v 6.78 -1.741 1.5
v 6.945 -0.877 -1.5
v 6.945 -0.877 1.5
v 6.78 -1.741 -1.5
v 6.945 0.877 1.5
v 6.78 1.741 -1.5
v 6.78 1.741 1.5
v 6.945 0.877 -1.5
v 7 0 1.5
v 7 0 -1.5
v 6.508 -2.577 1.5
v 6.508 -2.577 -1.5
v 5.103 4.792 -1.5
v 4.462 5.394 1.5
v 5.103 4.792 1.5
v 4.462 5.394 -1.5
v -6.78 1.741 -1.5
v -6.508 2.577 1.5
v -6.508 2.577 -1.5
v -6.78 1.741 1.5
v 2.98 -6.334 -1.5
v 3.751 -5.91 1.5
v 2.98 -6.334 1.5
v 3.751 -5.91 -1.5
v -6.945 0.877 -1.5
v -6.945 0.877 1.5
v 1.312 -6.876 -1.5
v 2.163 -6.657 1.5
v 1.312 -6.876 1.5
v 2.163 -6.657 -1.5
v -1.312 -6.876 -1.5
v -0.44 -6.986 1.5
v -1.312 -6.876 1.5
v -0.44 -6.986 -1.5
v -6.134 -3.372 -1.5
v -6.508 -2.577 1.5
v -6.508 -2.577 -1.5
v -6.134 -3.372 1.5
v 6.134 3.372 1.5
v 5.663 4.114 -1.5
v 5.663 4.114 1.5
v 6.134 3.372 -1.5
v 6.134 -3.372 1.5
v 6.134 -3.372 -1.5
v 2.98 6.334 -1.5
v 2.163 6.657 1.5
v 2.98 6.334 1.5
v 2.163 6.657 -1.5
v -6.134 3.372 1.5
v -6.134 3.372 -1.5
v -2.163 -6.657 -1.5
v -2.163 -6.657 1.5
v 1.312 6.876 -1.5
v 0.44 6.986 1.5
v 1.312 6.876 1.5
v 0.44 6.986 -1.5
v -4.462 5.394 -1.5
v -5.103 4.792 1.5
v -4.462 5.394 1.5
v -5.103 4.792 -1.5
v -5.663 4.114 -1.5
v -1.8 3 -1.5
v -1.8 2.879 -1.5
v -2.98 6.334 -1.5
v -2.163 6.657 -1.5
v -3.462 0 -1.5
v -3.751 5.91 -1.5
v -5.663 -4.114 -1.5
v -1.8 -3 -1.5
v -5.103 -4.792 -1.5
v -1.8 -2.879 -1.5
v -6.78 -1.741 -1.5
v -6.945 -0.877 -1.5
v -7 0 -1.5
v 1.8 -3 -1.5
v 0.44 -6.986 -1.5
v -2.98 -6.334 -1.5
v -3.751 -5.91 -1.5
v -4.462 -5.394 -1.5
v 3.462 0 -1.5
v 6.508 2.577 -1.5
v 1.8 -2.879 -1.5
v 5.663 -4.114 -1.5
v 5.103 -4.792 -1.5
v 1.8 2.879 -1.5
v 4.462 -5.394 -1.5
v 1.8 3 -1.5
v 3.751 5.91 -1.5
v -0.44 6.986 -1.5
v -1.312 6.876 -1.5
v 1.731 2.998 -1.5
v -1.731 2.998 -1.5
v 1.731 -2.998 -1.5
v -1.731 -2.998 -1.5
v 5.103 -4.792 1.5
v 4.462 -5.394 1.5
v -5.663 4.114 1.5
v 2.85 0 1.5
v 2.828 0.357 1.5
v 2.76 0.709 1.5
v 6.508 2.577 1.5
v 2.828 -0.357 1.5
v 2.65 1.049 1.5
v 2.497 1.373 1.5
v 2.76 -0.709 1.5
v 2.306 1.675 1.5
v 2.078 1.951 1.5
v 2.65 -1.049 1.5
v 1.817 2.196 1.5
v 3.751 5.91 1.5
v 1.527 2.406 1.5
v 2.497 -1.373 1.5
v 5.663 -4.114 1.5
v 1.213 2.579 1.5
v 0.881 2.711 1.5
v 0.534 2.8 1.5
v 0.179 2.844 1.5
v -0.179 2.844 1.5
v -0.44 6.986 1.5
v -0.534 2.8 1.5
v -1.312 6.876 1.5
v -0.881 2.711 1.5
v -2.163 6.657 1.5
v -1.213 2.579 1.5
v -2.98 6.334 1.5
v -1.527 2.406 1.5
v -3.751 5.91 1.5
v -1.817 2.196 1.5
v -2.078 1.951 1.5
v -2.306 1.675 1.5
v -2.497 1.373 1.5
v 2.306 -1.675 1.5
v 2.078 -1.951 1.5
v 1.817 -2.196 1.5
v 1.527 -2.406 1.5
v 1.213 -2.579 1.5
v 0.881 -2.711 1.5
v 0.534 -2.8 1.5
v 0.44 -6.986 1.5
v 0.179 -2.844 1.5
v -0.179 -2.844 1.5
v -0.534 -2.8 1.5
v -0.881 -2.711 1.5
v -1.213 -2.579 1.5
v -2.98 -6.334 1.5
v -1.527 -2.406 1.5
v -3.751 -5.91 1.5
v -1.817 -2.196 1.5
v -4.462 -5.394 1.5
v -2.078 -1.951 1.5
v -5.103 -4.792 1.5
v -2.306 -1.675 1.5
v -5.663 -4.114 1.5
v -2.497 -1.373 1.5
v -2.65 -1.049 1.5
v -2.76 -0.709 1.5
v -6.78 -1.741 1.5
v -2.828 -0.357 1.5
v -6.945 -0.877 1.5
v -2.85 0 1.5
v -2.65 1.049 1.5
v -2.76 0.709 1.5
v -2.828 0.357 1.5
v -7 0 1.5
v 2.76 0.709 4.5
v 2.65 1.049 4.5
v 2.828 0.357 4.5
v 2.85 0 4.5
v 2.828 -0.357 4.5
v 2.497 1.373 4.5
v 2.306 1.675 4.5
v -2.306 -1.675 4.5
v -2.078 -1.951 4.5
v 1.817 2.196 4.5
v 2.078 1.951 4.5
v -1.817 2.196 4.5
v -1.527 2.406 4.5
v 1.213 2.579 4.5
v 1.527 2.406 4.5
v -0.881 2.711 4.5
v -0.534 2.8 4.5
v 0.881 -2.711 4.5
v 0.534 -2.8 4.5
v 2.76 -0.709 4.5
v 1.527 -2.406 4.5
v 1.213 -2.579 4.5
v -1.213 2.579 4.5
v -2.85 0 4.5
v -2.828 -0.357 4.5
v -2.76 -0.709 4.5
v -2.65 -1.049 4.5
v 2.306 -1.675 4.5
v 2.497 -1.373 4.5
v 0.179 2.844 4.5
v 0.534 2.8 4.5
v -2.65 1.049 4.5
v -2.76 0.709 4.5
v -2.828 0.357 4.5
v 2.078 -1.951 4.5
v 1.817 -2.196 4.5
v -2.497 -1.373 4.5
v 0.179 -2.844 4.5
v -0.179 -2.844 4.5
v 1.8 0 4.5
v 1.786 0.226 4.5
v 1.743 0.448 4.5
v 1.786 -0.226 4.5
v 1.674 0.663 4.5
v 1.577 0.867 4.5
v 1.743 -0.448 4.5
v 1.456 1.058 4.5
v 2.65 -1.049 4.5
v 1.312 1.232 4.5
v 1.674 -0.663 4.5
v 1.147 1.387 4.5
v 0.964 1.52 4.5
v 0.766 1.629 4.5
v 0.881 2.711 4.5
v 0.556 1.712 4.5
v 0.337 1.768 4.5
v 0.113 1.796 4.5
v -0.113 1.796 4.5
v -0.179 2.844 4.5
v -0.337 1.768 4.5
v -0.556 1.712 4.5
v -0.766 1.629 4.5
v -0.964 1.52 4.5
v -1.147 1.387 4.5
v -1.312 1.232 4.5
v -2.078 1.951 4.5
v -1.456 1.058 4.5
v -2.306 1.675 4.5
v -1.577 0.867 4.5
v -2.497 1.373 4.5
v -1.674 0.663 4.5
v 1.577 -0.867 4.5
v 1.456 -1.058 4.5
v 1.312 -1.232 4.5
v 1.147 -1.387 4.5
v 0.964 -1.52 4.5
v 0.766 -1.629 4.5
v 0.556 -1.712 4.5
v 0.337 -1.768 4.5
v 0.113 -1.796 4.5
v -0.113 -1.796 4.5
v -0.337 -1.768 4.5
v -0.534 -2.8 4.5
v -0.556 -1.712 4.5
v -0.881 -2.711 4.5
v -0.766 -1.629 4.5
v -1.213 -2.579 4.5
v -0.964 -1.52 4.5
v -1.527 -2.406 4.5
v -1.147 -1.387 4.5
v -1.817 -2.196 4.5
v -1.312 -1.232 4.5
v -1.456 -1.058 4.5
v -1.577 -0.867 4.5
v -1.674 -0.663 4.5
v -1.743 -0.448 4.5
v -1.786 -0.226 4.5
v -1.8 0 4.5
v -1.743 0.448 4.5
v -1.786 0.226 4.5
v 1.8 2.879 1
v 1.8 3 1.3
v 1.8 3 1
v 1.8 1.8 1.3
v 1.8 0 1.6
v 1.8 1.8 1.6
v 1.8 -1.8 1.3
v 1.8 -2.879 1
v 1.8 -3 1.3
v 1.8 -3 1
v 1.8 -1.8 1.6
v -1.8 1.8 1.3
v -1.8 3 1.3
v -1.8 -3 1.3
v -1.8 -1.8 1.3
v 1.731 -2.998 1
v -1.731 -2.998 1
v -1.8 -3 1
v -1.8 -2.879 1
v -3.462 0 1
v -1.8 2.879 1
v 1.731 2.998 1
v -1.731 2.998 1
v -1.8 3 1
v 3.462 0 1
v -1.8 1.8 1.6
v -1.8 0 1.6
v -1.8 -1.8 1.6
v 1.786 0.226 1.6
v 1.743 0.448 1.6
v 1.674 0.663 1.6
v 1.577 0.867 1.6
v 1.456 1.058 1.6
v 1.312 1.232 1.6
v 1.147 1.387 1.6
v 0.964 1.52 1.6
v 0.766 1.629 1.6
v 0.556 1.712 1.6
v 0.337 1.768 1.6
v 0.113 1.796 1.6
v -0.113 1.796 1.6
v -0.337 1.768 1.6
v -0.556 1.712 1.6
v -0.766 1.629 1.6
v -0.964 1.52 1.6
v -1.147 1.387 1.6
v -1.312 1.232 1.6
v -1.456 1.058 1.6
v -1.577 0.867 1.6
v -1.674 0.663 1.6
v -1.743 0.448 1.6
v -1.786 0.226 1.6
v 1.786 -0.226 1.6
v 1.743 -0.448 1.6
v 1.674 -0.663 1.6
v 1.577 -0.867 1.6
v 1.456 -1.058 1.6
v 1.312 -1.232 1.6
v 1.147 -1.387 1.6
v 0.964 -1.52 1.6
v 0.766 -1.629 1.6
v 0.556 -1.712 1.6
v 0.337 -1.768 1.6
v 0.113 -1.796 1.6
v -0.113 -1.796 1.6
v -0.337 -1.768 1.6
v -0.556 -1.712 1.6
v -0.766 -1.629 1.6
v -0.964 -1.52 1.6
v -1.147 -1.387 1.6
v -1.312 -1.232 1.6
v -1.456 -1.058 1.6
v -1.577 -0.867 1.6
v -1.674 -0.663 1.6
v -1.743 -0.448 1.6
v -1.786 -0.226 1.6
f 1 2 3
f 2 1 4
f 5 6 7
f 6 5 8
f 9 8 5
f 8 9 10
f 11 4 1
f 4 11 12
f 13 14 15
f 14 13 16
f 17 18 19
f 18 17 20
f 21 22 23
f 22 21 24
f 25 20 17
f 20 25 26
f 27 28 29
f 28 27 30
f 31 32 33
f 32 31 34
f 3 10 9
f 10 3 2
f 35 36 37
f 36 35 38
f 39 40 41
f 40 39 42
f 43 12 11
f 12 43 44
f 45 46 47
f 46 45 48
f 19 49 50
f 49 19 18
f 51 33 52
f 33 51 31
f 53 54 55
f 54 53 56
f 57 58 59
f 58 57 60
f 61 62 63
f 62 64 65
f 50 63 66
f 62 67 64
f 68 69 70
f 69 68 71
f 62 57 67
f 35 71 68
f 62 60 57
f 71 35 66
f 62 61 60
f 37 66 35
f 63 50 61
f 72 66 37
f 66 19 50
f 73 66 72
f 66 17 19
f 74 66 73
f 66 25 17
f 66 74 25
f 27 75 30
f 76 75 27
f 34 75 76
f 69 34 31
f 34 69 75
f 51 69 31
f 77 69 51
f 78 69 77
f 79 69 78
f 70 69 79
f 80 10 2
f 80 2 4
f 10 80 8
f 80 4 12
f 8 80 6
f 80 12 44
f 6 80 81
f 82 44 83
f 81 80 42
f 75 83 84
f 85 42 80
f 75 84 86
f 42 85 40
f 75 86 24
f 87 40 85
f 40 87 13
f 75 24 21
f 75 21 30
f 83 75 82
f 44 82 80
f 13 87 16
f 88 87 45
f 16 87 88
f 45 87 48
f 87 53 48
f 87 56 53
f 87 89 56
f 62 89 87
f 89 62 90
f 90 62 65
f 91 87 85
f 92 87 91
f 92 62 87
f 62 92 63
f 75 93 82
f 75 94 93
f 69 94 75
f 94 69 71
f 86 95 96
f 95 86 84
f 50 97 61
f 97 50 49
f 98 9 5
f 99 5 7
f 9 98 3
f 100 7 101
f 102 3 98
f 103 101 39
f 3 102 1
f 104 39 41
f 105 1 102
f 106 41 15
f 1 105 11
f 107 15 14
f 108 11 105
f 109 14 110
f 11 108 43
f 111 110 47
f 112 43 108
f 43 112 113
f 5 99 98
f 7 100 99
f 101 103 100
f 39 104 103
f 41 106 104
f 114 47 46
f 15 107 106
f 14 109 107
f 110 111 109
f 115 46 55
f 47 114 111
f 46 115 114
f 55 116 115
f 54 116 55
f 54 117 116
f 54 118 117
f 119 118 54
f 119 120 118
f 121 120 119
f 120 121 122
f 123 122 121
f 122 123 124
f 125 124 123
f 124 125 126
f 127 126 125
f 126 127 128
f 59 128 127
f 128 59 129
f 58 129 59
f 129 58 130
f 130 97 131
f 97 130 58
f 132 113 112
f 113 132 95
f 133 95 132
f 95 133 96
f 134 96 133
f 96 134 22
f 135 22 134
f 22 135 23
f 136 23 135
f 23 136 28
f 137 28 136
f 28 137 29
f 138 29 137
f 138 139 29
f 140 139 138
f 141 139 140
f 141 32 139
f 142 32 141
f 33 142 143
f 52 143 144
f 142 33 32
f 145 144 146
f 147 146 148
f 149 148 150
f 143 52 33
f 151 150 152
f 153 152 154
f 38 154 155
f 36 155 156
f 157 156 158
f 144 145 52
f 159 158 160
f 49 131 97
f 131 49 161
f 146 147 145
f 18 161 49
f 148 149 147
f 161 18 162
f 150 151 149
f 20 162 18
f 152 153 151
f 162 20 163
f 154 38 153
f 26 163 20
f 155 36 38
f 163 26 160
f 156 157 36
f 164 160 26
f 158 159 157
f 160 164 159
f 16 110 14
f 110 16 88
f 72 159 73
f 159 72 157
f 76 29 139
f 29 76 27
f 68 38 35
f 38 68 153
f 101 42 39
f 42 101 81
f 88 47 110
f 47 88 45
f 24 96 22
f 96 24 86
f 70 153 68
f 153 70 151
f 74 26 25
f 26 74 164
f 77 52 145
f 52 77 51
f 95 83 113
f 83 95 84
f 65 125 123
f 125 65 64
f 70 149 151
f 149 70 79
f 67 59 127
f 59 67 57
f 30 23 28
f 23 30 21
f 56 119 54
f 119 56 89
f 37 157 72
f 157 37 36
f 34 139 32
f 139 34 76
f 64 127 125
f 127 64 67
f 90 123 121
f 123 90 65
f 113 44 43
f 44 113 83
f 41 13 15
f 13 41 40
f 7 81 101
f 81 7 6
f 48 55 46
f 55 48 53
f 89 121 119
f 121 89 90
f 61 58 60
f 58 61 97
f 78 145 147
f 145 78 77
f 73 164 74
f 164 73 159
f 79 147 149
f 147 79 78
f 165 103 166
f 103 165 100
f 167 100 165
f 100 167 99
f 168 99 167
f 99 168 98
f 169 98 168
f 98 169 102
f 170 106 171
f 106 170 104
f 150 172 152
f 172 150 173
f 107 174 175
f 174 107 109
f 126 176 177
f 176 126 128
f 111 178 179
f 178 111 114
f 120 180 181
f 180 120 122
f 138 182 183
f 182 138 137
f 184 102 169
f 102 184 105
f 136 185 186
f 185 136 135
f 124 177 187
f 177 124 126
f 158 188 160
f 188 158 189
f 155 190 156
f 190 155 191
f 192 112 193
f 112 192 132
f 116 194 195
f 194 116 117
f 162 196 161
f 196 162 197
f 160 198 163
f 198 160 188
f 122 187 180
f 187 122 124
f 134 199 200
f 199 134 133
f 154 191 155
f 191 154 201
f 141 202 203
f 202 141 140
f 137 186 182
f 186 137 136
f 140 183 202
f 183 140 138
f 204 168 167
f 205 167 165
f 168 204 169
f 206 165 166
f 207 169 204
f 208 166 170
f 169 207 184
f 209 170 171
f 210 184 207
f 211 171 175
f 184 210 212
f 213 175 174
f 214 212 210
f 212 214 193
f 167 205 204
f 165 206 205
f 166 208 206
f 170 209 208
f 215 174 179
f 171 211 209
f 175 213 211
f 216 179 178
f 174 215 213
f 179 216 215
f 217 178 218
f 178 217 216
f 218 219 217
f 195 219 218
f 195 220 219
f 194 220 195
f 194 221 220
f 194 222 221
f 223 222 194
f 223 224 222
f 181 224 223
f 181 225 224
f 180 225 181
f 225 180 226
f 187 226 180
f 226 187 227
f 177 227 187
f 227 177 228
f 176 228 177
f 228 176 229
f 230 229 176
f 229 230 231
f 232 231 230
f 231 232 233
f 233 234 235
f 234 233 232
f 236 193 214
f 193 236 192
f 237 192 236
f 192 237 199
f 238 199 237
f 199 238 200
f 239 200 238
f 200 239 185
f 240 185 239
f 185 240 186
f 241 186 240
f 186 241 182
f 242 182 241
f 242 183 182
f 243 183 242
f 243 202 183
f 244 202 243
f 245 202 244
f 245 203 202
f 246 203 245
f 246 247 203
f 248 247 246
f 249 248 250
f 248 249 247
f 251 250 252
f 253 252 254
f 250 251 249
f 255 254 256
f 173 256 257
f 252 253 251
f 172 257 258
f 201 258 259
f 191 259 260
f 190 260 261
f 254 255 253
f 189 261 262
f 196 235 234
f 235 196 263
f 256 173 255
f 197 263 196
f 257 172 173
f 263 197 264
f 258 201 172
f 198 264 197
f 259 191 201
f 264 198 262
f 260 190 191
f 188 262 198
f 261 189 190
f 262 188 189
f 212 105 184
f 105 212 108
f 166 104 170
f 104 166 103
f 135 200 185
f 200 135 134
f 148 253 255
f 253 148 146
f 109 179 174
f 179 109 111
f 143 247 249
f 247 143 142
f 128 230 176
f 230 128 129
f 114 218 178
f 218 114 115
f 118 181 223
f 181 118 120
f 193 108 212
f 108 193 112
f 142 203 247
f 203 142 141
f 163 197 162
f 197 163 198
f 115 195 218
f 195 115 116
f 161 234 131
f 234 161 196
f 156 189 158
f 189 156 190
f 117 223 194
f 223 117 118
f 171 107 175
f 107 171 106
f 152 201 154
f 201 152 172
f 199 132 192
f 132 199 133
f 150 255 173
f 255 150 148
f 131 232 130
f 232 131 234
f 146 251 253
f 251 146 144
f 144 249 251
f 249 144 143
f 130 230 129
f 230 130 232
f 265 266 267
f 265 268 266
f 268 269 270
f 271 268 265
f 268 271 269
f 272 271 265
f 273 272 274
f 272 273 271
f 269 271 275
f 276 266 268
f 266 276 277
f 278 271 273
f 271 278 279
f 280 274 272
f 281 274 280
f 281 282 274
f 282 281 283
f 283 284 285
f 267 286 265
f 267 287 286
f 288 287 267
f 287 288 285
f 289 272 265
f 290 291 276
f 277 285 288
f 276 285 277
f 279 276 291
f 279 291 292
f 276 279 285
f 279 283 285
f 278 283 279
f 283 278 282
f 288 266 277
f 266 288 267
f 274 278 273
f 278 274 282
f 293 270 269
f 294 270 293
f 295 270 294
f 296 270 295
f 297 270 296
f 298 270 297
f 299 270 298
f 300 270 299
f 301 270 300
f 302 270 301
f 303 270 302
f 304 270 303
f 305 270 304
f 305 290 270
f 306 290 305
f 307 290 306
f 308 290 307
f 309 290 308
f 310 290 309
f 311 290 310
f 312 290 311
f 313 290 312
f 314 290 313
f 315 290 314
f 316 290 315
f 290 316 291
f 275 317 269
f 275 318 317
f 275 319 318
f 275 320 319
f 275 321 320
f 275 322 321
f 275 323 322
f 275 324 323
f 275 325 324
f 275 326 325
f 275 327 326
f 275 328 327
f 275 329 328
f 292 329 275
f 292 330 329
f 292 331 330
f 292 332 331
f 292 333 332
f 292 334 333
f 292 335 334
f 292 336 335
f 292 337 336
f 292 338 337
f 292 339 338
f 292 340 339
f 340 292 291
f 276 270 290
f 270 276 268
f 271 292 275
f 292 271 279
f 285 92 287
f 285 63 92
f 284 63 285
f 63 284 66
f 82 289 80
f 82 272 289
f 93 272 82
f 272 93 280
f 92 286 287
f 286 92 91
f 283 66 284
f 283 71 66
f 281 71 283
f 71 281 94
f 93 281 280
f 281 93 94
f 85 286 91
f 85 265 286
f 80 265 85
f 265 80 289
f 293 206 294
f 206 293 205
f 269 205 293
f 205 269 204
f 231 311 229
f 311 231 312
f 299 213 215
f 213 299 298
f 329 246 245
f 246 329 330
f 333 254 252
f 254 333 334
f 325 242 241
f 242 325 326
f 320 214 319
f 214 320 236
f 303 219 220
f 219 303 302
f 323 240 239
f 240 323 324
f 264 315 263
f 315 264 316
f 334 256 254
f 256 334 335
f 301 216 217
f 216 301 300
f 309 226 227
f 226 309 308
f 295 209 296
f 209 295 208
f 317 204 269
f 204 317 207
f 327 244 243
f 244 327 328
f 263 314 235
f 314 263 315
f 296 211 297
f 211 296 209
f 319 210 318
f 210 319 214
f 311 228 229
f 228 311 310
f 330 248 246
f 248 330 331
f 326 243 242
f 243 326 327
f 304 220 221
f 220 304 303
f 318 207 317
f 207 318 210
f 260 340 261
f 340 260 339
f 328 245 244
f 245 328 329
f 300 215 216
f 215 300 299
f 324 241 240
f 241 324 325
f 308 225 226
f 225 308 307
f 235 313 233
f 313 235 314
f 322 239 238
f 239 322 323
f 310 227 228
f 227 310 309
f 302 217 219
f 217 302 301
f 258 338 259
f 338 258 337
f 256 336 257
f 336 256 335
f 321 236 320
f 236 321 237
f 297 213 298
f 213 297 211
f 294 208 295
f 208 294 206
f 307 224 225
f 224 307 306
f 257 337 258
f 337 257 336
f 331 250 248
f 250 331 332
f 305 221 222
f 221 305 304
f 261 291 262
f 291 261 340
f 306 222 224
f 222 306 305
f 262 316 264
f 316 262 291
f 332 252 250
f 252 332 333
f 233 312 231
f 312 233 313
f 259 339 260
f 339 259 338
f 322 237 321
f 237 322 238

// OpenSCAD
$fn = 50;


difference() {
	union() {
		translate(v = [0, 0, -1.5000000000]) {
			cylinder(h = 3, r = 7.0000000000);
		}
		translate(v = [0, 0, -1.5000000000]) {
			cylinder(h = 6, r = 2.8500000000);
		}
	}
	union() {
		translate(v = [0, 0, -1.5000000000]) {
			rotate(a = [0, 0, 0]) {
				difference() {
					union() {
						translate(v = [-1.8000000000, -3.0000000000, -0.3000000000]) {
							cube(size = [3.6000000000, 6.0000000000, 0.3000000000]);
						}
						translate(v = [-1.8000000000, -1.8000000000, -0.6000000000]) {
							cube(size = [3.6000000000, 3.6000000000, 0.3000000000]);
						}
						translate(v = [-1.8000000000, -3.0000000000, 2.5000000000]) {
							cube(size = [3.6000000000, 6.0000000000, 0.3000000000]);
						}
						translate(v = [-1.8000000000, -1.8000000000, 2.8000000000]) {
							cube(size = [3.6000000000, 3.6000000000, 0.3000000000]);
						}
						linear_extrude(height = 2.5000000000) {
							polygon(points = [[3.4620000000, 0.0000000000], [1.7310000000, 2.9981799479], [-1.7310000000, 2.9981799479], [-3.4620000000, 0.0000000000], [-1.7310000000, -2.9981799479], [1.7310000000, -2.9981799479]]);
						}
						translate(v = [-1.8000000000, -3.0000000000, -0.3000000000]) {
							cube(size = [3.6000000000, 6.0000000000, 0.3000000000]);
						}
						translate(v = [-1.8000000000, -1.8000000000, -0.6000000000]) {
							cube(size = [3.6000000000, 3.6000000000, 0.3000000000]);
						}
						translate(v = [-1.8000000000, -3.0000000000, 2.5000000000]) {
							cube(size = [3.6000000000, 6.0000000000, 0.3000000000]);
						}
						translate(v = [-1.8000000000, -1.8000000000, 2.8000000000]) {
							cube(size = [3.6000000000, 3.6000000000, 0.3000000000]);
						}
						translate(v = [-1.8000000000, -3.0000000000, -0.3000000000]) {
							cube(size = [3.6000000000, 6.0000000000, 0.3000000000]);
						}
						translate(v = [-1.8000000000, -1.8000000000, -0.6000000000]) {
							cube(size = [3.6000000000, 3.6000000000, 0.3000000000]);
						}
						translate(v = [-1.8000000000, -3.0000000000, 2.5000000000]) {
							cube(size = [3.6000000000, 6.0000000000, 0.3000000000]);
						}
						translate(v = [-1.8000000000, -1.8000000000, 2.8000000000]) {
							cube(size = [3.6000000000, 3.6000000000, 0.3000000000]);
						}
					}
					union();
				}
			}
		}
		translate(v = [0, 0, -50.0000000000]) {
			cylinder(h = 100, r = 1.8000000000);
		}
	}
}
